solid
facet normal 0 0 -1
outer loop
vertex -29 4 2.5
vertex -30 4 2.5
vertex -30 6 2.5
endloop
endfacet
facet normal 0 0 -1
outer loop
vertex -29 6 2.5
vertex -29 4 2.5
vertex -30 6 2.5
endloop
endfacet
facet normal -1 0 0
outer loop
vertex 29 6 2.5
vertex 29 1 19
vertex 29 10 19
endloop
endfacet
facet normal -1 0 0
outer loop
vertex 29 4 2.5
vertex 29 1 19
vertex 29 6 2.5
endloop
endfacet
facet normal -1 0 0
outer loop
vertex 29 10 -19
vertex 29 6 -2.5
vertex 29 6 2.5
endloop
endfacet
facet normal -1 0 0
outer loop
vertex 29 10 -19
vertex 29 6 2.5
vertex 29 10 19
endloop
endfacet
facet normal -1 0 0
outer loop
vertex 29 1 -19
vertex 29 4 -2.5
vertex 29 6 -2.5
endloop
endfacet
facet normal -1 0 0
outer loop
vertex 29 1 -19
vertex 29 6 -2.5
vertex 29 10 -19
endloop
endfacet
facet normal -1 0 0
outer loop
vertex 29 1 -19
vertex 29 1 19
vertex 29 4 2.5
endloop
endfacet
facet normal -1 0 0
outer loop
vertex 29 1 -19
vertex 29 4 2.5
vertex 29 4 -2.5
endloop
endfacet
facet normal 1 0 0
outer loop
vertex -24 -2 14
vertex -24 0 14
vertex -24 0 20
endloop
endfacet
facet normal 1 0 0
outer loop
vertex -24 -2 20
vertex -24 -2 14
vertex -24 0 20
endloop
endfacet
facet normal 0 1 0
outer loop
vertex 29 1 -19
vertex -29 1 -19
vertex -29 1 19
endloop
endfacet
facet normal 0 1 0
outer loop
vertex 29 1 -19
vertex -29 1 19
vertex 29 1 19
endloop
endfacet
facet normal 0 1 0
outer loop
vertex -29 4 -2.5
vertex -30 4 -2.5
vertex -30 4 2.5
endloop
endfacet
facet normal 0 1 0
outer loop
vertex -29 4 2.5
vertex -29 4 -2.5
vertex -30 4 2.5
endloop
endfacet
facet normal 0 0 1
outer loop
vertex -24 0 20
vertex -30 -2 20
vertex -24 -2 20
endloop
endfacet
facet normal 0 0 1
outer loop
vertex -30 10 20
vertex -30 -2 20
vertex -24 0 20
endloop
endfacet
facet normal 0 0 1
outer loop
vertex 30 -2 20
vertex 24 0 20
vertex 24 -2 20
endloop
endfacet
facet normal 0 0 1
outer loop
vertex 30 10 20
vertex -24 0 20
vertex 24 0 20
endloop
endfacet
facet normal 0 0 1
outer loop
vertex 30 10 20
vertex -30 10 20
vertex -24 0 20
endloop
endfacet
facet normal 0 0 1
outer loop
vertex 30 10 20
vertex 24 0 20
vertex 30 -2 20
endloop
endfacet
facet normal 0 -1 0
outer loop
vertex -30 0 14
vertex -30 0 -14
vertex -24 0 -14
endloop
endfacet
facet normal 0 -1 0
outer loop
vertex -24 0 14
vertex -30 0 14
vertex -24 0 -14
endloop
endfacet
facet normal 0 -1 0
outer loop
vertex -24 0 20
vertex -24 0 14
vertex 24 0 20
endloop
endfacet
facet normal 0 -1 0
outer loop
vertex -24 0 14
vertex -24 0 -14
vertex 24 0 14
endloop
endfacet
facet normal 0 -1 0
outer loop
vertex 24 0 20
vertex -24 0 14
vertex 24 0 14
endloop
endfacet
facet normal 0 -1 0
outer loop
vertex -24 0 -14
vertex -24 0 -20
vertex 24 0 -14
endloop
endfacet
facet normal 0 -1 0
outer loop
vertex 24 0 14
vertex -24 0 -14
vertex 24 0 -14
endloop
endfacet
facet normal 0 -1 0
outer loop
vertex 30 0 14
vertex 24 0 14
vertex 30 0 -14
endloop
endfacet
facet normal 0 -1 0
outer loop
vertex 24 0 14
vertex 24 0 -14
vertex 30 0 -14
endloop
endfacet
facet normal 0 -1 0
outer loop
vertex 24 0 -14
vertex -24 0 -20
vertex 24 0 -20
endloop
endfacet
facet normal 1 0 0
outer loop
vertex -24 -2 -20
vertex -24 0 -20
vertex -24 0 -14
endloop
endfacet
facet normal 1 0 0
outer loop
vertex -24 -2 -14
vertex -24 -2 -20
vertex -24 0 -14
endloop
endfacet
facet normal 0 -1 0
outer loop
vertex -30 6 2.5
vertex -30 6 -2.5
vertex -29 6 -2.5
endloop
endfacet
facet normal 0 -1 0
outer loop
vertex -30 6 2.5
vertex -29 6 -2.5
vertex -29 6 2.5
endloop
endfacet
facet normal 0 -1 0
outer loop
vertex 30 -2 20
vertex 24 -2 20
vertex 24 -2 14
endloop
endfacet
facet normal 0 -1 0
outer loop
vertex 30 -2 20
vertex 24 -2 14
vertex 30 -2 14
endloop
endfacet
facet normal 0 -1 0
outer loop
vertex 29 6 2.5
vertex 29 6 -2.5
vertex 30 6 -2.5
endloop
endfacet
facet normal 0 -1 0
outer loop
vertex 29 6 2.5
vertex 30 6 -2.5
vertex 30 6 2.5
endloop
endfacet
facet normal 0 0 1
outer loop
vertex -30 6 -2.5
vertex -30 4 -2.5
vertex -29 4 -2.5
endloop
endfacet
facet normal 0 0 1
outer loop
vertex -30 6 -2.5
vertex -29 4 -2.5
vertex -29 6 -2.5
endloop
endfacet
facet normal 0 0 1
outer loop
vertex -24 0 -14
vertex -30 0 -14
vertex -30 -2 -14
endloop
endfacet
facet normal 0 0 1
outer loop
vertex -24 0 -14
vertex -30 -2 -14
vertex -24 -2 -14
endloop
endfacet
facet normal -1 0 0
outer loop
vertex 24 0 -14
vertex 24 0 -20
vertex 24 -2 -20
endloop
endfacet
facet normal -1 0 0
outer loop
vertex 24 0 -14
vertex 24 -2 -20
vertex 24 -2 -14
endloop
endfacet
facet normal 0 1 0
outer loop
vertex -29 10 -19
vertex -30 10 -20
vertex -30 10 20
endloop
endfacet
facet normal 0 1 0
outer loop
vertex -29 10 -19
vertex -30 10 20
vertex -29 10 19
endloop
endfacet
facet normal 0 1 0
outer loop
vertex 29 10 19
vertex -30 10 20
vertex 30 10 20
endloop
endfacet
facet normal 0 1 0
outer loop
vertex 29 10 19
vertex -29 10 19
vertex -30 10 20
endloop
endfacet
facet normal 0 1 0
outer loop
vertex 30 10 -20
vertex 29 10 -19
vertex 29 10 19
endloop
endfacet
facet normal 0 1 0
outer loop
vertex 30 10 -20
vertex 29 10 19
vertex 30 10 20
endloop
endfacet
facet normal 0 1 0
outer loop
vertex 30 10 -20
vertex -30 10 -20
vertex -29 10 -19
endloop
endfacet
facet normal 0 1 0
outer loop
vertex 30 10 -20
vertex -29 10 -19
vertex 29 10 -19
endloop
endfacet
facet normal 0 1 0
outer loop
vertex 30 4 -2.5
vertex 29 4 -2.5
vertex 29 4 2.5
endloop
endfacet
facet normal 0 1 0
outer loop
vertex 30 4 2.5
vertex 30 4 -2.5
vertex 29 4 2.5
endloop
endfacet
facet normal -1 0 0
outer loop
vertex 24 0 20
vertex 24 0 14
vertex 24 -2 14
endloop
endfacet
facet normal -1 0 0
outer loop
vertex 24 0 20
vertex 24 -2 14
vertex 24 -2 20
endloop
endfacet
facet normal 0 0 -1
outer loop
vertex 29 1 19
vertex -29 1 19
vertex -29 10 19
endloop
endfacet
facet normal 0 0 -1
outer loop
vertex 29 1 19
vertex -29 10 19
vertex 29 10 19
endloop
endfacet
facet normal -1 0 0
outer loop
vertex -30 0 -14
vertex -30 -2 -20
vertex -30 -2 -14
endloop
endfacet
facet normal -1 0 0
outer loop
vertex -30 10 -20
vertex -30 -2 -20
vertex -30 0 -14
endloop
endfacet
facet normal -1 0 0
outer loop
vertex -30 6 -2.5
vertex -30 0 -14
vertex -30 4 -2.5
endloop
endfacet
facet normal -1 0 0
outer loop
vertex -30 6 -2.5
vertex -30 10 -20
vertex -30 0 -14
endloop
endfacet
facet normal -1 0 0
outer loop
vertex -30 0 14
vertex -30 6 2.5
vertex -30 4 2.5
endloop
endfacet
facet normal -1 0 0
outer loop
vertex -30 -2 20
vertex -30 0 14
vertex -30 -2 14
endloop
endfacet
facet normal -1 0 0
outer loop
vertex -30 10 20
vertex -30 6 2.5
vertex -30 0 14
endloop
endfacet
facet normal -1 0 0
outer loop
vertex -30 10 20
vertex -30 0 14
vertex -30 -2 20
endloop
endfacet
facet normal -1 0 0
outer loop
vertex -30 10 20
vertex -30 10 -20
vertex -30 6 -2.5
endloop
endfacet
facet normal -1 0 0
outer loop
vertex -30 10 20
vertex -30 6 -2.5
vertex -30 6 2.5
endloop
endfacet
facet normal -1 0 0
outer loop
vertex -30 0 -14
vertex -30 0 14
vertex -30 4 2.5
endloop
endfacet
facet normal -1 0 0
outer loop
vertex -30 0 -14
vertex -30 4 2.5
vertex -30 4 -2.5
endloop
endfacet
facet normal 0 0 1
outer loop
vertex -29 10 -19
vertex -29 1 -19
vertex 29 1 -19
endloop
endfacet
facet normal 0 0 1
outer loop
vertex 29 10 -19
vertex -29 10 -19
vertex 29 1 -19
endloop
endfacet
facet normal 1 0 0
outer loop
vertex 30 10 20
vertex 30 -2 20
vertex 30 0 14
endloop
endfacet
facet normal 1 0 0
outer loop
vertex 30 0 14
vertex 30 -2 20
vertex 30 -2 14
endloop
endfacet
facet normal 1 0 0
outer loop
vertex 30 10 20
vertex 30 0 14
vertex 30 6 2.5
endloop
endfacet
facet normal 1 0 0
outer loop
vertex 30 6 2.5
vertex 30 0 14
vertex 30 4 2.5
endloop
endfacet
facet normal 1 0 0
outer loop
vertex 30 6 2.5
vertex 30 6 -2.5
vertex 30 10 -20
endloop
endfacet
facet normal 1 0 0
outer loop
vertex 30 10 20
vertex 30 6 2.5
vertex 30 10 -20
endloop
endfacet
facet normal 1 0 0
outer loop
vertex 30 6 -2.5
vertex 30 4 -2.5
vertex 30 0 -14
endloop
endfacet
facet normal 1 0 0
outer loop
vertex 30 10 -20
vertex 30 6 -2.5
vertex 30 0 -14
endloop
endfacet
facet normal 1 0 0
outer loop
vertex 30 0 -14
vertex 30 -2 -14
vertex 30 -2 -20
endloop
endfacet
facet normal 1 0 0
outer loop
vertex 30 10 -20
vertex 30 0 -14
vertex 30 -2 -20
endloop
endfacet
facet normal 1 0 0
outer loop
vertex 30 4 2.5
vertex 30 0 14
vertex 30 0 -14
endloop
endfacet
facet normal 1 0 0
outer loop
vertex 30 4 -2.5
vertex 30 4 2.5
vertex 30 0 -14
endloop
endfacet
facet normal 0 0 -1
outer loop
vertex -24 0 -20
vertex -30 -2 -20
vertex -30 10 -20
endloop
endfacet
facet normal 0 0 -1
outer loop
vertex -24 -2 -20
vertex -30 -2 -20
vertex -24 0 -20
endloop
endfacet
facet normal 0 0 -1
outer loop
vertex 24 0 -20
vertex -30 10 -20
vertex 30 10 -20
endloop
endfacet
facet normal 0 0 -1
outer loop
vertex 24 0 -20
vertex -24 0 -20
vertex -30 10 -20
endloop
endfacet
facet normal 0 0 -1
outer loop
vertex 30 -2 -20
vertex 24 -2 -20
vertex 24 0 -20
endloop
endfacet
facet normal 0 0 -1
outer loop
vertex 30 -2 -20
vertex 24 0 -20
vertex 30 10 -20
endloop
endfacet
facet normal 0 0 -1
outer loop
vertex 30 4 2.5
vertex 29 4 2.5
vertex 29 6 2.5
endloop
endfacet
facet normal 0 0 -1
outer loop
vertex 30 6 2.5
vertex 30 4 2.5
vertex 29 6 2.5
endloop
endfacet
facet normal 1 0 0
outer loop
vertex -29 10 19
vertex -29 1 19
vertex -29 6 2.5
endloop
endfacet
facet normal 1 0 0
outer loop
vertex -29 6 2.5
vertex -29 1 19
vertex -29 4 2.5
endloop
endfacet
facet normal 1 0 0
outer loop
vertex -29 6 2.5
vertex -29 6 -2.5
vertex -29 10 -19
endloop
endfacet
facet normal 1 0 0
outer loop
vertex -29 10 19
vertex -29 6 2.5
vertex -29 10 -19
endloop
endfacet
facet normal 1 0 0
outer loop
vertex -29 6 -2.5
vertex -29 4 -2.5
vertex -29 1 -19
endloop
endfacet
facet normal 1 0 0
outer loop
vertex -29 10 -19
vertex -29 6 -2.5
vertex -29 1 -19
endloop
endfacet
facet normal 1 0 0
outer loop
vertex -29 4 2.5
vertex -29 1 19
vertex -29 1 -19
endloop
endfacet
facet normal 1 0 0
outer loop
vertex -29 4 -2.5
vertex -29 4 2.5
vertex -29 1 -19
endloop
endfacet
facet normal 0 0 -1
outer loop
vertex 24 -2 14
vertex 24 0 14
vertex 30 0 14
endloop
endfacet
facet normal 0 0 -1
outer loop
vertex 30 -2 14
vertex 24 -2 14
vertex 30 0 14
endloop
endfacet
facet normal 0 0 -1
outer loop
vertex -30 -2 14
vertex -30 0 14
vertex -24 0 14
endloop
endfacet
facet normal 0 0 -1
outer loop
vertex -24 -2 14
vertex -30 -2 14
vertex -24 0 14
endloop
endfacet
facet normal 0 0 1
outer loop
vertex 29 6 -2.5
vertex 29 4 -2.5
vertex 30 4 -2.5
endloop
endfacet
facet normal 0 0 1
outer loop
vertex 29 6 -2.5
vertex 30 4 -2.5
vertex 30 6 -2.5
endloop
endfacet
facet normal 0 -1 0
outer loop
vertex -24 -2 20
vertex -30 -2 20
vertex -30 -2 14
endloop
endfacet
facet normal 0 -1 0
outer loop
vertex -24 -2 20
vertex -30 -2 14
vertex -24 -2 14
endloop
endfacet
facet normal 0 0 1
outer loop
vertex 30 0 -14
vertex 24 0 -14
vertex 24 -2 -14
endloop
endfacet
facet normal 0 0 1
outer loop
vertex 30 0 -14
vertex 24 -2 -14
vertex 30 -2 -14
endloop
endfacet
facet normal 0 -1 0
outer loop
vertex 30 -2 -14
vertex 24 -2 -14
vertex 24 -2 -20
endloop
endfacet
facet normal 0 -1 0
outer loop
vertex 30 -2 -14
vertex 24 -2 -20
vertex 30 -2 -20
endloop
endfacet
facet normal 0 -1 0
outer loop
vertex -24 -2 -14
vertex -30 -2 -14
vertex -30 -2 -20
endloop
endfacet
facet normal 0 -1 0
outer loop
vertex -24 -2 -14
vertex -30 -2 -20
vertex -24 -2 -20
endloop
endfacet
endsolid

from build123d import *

# Parameters (mm, degrees)
CROQUIS1_W              = 60
CROQUIS1_H              = 40
SALIENTE_EXTRUIR1_DEPTH = 10
VACIADO3_T              = -1
CROQUIS3_W              = 5
CROQUIS3_H              = 2
CORTAR_EXTRUIR1_DEPTH   = 65.031242374
CROQUIS4_W              = 6
CROQUIS4_H              = 6
SALIENTE_EXTRUIR2_DEPTH = 2


with BuildPart() as part:
    # Croquis1 → Saliente-Extruir1 (new body)
    with BuildSketch(Plane(origin=(0, 0, 0), x_dir=(1, 0, 0), z_dir=(0, 1, 0))):
        Rectangle(CROQUIS1_W, CROQUIS1_H)
    extrude(amount=SALIENTE_EXTRUIR1_DEPTH)

    # Vaciado3
    vaciado3_openings = [part.faces().sort_by_distance(p)[0] for p in [
        (0, 10, 0),
    ]]
    offset(amount=VACIADO3_T, openings=vaciado3_openings, kind=Kind.INTERSECTION)

    # Croquis3 → Cortar-Extruir1 (cut, through all)
    with BuildSketch(Plane.ZY.offset(30)):
        with Locations((0, 5)):
            Rectangle(CROQUIS3_W, CROQUIS3_H)
    extrude(amount=-CORTAR_EXTRUIR1_DEPTH, mode=Mode.SUBTRACT)

    # Croquis4 → Saliente-Extruir2 (add)
    with BuildSketch(Plane.XZ):
        with Locations((-27, 17)):
            Rectangle(CROQUIS4_W, CROQUIS4_H)
        with Locations((-27, -17)):
            Rectangle(CROQUIS4_W, CROQUIS4_H)
        with Locations((27, -17)):
            Rectangle(CROQUIS4_W, CROQUIS4_H)
        with Locations((27, 17)):
            Rectangle(CROQUIS4_W, CROQUIS4_H)
    extrude(amount=SALIENTE_EXTRUIR2_DEPTH)


solid = part.part
